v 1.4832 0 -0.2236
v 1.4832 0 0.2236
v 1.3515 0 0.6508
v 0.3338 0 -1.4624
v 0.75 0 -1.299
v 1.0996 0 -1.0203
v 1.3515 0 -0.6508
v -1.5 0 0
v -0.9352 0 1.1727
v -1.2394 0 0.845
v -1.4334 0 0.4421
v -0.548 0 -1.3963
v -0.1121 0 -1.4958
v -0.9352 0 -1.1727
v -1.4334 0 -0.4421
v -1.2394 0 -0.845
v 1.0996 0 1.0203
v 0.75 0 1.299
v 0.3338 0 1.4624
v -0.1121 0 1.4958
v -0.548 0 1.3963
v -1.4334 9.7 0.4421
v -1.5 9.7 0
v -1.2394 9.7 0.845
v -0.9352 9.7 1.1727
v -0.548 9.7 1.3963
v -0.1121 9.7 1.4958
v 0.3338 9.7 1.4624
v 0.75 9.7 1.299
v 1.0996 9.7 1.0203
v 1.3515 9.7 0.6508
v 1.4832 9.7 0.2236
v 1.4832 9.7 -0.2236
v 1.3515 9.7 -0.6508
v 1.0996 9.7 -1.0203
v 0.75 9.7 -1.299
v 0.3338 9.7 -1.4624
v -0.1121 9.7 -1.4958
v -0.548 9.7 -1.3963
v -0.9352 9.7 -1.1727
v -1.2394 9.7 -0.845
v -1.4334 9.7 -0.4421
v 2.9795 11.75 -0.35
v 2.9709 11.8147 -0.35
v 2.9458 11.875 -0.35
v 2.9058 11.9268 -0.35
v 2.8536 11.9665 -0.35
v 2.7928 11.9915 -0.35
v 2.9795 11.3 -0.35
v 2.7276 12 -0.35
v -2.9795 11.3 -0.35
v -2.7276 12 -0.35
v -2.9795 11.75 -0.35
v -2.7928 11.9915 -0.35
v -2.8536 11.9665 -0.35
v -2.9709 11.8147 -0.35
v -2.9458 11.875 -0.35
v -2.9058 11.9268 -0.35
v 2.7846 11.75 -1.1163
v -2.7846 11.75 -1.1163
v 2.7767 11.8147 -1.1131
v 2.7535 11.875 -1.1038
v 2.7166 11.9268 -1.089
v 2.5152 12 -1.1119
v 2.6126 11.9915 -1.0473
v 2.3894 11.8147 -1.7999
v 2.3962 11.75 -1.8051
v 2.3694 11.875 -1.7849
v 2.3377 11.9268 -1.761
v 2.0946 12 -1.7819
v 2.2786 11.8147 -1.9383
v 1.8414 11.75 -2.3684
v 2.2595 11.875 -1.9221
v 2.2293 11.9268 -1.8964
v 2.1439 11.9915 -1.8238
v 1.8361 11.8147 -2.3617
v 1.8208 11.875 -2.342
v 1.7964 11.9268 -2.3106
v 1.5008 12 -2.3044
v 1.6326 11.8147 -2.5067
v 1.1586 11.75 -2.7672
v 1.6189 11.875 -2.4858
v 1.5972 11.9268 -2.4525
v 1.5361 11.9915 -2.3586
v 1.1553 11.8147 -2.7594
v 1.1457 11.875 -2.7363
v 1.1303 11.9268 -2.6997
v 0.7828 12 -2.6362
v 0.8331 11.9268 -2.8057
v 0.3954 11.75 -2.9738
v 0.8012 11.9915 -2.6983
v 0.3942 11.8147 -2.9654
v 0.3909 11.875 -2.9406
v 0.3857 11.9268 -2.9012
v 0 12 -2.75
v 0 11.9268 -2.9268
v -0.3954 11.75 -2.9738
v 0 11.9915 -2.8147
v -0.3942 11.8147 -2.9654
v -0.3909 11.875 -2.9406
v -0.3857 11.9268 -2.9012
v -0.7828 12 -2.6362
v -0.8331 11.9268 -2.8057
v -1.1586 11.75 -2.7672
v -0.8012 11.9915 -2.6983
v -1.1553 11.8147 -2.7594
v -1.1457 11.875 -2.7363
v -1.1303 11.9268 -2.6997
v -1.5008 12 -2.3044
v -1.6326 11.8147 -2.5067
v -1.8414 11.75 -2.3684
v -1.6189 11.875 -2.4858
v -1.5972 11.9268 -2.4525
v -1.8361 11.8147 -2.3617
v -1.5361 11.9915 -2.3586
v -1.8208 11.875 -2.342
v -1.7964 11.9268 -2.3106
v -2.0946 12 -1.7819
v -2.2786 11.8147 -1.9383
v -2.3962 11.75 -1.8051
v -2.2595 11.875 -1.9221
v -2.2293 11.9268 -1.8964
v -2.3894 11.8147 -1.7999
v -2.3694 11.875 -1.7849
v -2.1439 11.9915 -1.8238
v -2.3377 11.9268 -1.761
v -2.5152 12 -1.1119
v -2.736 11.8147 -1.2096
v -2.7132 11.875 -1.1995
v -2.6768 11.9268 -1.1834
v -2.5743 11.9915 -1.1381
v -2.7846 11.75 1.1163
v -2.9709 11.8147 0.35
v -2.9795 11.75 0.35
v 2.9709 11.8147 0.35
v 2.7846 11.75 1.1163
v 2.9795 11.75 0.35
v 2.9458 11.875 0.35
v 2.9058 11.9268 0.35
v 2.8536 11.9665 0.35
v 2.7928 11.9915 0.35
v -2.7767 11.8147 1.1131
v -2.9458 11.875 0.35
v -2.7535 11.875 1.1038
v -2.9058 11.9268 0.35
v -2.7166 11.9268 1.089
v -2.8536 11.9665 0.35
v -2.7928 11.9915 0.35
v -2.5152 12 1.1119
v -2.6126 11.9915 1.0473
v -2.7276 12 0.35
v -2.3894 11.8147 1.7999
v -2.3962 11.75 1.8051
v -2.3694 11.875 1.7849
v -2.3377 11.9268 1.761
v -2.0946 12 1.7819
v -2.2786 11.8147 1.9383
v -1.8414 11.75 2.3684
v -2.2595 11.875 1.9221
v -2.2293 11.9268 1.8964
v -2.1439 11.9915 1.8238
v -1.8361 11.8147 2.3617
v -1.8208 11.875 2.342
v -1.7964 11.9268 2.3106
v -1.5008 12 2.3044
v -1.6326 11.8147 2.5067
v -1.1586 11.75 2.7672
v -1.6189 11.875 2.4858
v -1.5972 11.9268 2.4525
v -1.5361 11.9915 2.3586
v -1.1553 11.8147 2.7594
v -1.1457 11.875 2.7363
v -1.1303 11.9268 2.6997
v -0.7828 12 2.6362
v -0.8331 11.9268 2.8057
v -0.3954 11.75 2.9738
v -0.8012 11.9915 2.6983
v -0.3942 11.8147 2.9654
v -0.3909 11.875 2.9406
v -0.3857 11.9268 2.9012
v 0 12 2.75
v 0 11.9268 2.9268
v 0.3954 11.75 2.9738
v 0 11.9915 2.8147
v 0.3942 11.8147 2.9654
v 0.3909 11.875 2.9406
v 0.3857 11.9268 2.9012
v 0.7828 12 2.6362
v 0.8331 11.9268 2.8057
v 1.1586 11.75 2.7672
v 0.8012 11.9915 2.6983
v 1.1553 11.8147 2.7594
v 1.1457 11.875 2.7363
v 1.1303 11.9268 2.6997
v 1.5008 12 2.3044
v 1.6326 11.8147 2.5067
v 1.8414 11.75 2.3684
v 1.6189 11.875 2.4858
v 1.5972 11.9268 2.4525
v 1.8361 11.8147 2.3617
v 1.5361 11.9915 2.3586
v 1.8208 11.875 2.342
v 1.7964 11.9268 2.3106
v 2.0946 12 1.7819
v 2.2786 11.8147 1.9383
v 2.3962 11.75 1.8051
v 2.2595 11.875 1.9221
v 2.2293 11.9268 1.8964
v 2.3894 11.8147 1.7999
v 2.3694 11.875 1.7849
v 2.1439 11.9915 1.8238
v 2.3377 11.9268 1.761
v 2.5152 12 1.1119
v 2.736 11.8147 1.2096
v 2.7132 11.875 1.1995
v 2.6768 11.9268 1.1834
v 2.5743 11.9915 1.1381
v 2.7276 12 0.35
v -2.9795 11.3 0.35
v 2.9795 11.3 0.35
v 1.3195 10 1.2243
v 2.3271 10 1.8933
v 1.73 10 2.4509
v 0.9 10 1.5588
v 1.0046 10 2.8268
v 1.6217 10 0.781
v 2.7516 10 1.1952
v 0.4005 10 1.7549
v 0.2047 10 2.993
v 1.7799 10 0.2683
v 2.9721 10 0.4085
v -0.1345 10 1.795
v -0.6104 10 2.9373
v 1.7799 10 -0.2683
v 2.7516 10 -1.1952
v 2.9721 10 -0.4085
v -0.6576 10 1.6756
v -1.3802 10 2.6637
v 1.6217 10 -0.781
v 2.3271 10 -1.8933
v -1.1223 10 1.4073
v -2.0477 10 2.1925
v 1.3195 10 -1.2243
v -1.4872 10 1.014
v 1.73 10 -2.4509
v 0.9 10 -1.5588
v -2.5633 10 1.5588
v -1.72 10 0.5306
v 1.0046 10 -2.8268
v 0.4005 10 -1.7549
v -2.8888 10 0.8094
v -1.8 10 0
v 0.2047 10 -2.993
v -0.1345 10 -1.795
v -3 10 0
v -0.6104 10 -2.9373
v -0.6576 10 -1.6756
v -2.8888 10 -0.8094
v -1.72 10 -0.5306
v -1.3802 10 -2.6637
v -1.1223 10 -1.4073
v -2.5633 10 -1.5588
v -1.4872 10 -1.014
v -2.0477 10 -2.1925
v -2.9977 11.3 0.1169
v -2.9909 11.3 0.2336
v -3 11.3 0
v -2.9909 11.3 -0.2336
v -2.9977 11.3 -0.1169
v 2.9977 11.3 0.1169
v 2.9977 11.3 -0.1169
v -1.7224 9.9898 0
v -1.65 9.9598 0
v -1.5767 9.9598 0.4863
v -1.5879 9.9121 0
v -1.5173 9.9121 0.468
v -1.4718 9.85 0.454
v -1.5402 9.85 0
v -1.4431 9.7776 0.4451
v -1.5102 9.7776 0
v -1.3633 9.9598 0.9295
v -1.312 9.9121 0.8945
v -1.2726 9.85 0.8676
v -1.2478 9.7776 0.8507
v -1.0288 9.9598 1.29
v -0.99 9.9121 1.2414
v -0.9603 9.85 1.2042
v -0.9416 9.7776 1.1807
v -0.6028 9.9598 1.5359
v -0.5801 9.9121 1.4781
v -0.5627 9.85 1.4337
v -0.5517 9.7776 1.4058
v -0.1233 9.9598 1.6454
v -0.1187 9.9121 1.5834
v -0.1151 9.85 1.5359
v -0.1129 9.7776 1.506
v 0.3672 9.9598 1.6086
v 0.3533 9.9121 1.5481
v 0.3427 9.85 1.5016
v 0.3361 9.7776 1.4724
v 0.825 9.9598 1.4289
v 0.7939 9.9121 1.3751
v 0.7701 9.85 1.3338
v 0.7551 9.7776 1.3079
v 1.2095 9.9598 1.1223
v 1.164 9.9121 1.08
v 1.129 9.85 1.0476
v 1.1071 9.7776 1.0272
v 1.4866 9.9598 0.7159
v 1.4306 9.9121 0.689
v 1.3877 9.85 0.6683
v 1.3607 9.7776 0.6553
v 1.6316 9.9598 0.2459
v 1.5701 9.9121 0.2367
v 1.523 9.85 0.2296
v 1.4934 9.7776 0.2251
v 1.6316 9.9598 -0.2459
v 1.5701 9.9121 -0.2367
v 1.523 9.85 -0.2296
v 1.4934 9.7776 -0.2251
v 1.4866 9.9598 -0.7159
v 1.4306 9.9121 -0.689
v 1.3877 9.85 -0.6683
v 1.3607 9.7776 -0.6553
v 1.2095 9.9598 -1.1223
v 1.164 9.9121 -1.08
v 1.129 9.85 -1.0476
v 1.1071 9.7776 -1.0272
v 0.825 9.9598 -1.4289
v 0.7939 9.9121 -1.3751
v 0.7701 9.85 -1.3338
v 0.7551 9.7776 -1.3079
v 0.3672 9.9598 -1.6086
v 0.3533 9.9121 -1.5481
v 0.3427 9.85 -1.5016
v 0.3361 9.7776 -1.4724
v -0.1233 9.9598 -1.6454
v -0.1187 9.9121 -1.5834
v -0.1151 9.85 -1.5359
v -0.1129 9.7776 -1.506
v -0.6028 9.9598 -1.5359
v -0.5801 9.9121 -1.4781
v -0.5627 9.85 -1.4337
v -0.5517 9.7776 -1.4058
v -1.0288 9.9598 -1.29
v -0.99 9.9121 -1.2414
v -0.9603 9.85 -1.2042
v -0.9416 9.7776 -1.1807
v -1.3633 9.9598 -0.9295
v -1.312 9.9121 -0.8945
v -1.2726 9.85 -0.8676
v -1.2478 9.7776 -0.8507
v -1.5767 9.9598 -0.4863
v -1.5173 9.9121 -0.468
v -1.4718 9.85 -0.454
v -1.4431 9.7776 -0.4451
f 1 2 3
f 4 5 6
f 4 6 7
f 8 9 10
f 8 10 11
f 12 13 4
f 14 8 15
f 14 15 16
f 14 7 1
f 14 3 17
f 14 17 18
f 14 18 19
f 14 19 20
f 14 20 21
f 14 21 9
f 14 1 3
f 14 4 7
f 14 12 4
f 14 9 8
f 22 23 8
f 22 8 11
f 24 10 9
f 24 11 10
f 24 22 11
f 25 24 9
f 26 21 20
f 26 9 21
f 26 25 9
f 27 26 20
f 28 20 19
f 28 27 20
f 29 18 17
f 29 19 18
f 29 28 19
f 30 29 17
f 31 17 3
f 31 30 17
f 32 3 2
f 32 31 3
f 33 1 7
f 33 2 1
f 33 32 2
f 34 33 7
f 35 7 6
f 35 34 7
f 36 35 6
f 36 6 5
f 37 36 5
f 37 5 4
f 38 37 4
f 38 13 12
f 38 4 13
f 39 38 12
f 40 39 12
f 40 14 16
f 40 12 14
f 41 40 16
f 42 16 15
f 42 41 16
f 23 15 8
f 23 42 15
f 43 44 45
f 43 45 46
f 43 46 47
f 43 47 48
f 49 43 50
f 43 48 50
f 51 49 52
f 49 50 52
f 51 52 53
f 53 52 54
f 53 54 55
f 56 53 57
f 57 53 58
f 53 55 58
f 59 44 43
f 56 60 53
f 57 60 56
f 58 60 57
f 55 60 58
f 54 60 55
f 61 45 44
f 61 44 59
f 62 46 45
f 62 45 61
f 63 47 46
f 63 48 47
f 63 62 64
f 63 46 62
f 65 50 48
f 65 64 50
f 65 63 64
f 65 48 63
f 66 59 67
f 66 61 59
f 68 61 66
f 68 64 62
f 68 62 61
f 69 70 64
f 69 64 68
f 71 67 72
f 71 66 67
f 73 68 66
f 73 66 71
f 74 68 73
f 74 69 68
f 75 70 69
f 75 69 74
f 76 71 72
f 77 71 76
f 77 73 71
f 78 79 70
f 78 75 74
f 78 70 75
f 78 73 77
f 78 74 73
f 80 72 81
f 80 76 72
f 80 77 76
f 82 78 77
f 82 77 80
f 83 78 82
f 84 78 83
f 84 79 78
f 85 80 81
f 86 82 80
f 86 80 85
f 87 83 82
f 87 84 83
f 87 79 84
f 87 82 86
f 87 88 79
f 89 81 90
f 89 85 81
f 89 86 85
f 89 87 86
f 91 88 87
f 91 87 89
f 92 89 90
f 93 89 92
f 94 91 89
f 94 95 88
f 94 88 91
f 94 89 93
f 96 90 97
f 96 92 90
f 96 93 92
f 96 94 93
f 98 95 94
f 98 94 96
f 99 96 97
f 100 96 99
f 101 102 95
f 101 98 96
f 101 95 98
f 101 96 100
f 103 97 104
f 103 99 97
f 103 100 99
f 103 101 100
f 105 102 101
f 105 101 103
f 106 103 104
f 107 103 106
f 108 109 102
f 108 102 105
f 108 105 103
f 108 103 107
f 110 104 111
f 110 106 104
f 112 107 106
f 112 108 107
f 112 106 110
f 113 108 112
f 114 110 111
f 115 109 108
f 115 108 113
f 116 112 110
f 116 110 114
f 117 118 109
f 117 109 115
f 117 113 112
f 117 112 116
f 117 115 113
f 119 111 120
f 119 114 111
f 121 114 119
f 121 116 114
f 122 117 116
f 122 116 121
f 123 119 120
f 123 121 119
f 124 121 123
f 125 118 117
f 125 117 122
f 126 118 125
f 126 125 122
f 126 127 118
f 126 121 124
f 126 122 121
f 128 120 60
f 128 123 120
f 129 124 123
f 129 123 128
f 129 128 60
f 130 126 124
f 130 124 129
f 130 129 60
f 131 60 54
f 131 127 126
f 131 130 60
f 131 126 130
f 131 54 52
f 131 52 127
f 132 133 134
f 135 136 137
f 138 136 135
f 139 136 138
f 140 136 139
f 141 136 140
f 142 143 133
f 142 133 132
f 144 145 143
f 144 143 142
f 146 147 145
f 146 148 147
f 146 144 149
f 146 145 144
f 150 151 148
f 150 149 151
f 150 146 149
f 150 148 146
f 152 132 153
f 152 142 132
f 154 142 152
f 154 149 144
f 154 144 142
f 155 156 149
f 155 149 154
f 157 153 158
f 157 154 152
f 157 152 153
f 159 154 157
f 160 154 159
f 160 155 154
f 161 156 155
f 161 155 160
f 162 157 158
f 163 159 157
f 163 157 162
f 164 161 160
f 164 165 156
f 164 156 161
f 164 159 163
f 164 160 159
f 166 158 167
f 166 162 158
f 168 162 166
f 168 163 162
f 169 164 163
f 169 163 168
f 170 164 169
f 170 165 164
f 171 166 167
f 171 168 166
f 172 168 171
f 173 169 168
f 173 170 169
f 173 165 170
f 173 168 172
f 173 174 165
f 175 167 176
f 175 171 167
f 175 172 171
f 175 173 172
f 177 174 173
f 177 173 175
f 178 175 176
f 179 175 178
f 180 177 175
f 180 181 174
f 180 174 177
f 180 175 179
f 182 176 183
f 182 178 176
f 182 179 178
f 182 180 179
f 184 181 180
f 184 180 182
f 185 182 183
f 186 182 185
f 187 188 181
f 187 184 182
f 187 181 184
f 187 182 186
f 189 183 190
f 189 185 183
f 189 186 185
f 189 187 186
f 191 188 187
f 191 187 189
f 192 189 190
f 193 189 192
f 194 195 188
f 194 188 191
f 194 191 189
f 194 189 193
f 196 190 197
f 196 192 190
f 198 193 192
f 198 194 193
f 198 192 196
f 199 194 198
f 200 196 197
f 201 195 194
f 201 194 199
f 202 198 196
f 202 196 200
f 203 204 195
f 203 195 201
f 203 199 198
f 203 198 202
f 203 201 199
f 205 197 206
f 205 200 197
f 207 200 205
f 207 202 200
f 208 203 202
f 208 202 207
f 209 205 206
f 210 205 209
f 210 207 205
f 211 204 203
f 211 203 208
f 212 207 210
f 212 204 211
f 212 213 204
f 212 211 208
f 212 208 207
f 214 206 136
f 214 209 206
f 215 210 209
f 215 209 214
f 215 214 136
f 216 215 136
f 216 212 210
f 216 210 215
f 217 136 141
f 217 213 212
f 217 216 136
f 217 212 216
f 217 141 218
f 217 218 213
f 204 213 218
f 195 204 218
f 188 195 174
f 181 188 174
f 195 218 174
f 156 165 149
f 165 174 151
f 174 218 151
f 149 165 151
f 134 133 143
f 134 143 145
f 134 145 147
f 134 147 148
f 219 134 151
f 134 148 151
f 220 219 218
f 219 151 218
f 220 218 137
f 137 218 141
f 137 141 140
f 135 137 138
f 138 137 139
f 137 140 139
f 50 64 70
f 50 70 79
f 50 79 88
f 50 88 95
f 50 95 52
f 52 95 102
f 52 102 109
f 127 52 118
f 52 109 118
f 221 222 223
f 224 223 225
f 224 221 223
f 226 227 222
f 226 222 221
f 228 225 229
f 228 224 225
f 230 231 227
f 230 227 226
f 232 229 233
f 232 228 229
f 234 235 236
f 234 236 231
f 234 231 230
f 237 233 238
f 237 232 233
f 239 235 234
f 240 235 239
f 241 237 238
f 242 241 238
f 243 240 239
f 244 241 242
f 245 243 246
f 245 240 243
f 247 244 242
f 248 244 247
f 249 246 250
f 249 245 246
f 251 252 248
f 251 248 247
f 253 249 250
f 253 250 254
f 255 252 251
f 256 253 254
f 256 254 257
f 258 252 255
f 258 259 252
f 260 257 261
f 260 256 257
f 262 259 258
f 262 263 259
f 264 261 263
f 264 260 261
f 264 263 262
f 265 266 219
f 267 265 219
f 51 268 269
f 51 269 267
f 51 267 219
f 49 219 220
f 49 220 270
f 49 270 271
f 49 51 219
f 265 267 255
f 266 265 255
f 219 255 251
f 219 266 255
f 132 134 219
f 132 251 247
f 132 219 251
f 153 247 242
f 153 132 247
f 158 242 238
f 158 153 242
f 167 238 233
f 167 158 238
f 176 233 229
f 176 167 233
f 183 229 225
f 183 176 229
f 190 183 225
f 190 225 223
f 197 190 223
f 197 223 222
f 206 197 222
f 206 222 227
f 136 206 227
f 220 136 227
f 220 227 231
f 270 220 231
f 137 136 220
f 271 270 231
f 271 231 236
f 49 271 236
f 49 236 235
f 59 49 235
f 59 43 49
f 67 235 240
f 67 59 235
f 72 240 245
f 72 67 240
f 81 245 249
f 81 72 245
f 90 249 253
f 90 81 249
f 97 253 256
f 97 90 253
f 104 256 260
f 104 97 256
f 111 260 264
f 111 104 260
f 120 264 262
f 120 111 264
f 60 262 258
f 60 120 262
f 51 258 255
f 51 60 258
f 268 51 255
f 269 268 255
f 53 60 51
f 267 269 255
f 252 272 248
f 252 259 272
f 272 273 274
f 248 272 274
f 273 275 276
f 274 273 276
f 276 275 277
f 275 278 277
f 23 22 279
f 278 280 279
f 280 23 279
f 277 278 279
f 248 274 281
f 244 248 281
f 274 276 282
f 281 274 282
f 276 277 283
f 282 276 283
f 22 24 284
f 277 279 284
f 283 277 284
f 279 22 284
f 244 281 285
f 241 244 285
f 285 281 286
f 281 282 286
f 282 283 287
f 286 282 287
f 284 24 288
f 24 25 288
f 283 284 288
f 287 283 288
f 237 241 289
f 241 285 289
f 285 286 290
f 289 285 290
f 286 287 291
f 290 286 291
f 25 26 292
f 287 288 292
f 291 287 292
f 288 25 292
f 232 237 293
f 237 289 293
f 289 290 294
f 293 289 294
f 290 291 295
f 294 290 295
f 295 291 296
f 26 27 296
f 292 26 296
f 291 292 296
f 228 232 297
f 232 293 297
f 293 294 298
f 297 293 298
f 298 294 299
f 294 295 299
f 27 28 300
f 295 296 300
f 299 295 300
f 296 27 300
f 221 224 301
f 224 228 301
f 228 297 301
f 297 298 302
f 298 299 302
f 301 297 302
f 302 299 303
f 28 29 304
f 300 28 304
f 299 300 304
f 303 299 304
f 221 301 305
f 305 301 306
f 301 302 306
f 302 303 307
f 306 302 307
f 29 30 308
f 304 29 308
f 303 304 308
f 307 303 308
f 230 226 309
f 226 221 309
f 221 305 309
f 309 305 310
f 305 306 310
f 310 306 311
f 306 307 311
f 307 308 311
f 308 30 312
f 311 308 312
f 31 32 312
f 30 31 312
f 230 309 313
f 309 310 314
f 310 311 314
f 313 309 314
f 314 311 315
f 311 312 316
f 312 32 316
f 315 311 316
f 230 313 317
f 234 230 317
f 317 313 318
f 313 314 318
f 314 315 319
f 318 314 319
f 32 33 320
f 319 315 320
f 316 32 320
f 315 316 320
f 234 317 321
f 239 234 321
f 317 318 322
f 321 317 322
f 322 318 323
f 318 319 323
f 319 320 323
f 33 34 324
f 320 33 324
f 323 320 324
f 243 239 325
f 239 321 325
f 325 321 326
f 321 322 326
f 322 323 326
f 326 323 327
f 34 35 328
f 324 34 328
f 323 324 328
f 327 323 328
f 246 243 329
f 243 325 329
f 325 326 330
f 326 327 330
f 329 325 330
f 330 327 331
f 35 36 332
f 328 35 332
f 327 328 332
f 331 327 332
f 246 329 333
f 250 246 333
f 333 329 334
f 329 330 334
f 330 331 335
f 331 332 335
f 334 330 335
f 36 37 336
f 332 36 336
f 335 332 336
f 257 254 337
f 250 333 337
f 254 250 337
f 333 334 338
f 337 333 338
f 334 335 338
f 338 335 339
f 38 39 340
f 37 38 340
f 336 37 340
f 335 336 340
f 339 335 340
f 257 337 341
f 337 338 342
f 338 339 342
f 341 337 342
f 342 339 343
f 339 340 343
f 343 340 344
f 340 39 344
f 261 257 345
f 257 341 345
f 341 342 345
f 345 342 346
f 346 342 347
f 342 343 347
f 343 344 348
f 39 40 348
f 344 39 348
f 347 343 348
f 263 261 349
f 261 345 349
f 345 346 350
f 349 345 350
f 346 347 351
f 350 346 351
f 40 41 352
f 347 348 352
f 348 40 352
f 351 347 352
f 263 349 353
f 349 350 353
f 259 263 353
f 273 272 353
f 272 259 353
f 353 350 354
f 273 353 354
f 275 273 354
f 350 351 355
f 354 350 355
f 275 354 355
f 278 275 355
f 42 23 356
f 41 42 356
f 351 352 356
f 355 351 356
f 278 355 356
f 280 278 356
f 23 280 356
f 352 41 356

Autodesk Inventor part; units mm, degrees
ref_plane "YZ Plane" through (0, 0, 0) normal (1, 0, 0) x (0, 1, 0)
ref_plane "XZ Plane" through (0, 0, 0) normal (0, 1, 0) x (-1, 0, 0)
ref_plane "XY Plane" through (0, 0, 0) normal (0, 0, 1) x (1, 0, 0)
sketch "Sketch1" plane through (0, 0, 0) normal (0, 0, 1) x (1, 0, 0)
  line L0 (0, 0) -> (-1.5, 0)
  line L1 (-1.5, 0) -> (-1.5, 9)
  line L2 (-1.5, 9) -> (-1.5, 9)
  line L3 (-1.5, 9) -> (-1.5, 10)
  line L4 (-1.5, 10) -> (-3, 10)
  line L5 (-3, 10) -> (-3, 12)
  line L6 (-3, 12) -> (0, 12)
  line L7 (0, 12) -> (0, 0)
  dimension "d0" = 2
  dimension "d1" = 3
  dimension "d2" = 1.5
  dimension "d3" = 0
  dimension "d4" = 1
  dimension "d5" = 12
  dimension "d6" = 90
revolve "Revolution1" add sketch "Sketch1" angle 360 about axis through (0, 12, 0) along (0, -1, 0)
thread "Thread1" size "M3x0.35" class "6g" standard "ANSI Metric M Profile" length 27
sketch "Sketch2" plane through (0, 12, 0) normal (0, 1, 0) x (1, 0, 0)
  line L0 (5, 0.35) -> (-5, 0.35)
  line L1 (-5, 0.35) -> (-5, -0.35)
  line L2 (-5, -0.35) -> (5, -0.35)
  line L3 (5, -0.35) -> (5, 0.35)
  line L4 (5, 0.35) -> (-5, -0.35) construction
  line L5 (-5, 0.35) -> (5, -0.35) construction
  point P0 (0, 0)
  dimension "d10" = 10
  dimension "d11" = 0.7
fillet "Fillet1" radius 0.25 1 edges at (3, 12, 0)
extrude "Extrusion2" cut sketch "Sketch2" against normal blind 0.7
fillet "Fillet2" radius 0.3 1 edges at (1.5, 10, 0)
properties part number "Screw-CheeseHead-Brass-M3x10-Fine" material "Brass, Soft Yellow"
